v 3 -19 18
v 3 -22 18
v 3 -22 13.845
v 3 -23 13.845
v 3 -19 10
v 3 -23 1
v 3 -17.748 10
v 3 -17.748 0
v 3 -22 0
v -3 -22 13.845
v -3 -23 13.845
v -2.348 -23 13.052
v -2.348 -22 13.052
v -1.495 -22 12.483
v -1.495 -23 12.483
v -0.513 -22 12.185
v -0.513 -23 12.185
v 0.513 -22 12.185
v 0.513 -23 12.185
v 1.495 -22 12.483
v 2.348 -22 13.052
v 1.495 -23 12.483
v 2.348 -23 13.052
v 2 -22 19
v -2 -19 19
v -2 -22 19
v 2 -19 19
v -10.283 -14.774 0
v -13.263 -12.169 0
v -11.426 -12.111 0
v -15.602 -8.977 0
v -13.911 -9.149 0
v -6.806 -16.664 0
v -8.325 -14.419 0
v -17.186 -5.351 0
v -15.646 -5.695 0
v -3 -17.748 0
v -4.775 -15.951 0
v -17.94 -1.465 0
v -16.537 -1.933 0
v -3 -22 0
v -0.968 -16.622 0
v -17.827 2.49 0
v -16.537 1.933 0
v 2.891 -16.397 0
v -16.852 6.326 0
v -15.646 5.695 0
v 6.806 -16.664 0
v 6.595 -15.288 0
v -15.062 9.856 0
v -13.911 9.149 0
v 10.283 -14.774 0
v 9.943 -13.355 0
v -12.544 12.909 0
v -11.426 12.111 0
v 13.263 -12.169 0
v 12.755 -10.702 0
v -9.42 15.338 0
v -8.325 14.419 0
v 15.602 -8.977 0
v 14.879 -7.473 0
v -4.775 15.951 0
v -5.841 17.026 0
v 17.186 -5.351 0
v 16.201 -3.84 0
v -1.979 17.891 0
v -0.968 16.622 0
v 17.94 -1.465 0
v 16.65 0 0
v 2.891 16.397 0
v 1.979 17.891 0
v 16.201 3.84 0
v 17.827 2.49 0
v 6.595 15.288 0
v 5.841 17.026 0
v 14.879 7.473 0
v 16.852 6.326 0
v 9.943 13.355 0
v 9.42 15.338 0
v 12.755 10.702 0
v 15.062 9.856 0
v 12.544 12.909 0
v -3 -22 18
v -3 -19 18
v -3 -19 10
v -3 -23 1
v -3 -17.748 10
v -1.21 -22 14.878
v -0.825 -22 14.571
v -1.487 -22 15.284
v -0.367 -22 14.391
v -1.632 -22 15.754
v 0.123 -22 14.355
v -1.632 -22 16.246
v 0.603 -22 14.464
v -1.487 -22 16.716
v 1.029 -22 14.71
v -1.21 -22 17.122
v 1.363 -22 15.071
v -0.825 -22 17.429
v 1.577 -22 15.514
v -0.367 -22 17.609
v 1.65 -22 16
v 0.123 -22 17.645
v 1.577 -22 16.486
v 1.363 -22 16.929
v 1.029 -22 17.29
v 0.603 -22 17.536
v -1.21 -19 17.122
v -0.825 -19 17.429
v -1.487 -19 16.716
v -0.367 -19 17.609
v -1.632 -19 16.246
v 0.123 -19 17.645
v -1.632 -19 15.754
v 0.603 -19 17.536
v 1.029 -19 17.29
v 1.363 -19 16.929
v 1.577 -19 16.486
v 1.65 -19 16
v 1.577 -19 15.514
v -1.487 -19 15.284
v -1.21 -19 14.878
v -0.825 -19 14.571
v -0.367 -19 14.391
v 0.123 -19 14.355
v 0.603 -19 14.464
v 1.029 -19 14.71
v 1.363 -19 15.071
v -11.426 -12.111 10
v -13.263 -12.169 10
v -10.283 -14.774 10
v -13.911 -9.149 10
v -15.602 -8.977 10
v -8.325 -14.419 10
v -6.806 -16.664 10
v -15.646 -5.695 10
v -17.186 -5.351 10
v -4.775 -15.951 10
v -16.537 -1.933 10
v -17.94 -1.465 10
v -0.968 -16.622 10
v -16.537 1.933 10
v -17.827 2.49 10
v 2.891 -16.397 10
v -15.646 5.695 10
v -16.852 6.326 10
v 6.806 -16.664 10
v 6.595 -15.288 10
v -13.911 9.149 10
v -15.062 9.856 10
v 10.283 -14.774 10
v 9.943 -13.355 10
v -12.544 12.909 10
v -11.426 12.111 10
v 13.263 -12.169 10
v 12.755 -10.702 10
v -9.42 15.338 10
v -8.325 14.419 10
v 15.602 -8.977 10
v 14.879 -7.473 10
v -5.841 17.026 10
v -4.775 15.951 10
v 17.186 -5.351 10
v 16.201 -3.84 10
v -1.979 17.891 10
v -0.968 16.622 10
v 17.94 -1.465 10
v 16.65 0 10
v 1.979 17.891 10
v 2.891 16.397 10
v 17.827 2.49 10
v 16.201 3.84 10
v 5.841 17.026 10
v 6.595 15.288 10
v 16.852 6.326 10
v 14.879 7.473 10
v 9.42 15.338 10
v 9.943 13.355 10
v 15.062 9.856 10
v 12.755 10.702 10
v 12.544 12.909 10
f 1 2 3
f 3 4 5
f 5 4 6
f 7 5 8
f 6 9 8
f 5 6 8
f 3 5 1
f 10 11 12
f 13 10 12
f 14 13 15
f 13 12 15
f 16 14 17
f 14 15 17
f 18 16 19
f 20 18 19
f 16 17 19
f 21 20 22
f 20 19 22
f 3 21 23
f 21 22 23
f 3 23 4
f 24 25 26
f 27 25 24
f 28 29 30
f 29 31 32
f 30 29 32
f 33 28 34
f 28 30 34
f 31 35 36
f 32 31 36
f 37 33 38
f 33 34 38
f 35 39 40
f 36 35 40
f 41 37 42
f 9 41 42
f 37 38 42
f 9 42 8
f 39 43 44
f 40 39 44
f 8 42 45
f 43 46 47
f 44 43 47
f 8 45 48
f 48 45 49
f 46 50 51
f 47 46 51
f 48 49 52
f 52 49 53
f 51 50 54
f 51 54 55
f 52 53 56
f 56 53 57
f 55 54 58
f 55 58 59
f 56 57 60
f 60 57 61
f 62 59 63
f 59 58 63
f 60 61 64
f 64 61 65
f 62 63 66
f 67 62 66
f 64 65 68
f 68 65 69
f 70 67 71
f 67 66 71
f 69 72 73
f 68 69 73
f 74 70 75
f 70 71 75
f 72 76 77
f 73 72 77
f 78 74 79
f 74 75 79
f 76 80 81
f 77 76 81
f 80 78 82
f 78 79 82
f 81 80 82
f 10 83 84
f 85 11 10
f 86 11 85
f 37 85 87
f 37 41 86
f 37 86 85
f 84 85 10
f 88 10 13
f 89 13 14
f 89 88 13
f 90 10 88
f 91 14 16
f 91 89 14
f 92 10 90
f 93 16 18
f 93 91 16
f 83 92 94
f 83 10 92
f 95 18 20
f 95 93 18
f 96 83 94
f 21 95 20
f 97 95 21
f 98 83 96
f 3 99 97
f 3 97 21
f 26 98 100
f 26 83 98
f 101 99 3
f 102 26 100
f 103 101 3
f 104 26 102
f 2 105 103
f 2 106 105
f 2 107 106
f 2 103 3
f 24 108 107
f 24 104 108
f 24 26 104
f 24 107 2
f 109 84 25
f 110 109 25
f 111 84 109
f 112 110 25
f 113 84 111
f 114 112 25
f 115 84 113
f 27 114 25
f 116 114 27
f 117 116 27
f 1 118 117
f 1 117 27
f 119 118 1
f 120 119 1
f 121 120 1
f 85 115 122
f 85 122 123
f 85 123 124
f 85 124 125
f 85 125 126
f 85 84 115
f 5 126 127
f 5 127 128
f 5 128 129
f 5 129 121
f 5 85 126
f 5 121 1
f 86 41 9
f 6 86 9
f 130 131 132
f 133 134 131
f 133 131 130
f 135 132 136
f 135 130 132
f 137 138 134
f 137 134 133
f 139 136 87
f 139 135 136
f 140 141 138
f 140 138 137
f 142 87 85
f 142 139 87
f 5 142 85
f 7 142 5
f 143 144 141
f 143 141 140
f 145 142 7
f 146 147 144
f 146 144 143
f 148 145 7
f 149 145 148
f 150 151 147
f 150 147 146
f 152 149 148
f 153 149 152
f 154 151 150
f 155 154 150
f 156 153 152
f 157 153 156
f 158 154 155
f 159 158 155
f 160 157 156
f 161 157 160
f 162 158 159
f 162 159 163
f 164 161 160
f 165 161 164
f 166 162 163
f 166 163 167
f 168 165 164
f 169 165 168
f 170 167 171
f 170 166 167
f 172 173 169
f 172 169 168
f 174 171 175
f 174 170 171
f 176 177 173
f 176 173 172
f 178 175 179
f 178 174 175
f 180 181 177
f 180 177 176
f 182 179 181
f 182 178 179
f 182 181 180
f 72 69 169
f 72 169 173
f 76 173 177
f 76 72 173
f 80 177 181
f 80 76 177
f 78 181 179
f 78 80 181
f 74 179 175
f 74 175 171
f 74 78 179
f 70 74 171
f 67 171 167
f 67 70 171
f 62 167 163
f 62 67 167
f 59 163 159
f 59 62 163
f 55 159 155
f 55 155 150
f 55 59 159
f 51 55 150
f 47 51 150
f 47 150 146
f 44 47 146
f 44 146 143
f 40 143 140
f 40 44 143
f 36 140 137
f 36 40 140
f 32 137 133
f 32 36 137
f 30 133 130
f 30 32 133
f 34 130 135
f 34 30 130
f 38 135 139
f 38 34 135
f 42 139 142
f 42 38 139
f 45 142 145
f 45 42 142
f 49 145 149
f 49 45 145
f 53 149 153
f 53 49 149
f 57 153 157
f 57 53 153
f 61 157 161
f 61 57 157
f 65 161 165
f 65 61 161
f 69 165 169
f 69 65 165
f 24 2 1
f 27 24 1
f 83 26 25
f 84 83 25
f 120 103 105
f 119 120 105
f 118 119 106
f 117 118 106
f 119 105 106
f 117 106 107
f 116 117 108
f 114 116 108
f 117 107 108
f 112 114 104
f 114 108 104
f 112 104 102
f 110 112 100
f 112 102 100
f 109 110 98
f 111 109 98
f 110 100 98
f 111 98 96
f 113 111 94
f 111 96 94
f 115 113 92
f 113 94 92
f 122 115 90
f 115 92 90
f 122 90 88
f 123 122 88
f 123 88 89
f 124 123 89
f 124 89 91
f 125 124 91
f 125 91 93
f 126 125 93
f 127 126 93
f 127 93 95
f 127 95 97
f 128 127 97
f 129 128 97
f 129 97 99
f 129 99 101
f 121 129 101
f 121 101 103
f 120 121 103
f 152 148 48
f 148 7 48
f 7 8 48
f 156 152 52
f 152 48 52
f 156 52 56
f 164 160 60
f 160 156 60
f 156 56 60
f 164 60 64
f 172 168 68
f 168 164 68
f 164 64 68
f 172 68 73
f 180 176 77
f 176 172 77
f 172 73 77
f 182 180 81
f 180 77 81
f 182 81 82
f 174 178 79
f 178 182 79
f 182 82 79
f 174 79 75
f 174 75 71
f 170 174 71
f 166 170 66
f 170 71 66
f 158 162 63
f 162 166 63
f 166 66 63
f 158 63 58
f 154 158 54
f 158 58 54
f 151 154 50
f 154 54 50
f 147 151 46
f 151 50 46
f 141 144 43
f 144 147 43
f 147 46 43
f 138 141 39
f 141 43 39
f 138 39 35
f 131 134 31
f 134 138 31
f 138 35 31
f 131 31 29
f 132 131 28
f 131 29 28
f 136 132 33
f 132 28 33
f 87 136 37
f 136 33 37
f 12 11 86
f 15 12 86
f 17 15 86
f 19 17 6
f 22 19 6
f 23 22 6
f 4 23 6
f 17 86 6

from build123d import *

# Parameters (mm, degrees)
SKETCH002_R     = 18
SKETCH002_R_2   = 16.65
PAD002_DEPTH    = 10
PAD003_DEPTH    = 10
SKETCH004_W     = 6
SKETCH004_H     = 4
PAD004_DEPTH    = 9
SKETCH005_R     = 1.65
POCKET_DEPTH    = 5
POCKET001_DEPTH = 1
CHAMFER001_SIZE = 1
CHAMFER002_SIZE = 1


with BuildPart() as part:
    # Sketch002 → Pad002 (new body)
    with BuildSketch(Plane.XY):
        Circle(SKETCH002_R)
        Circle(SKETCH002_R_2, mode=Mode.SUBTRACT)
    extrude(amount=PAD002_DEPTH)

    # Sketch003 (on Face3 of Pad002) → Pad003 (join)
    with BuildSketch(Plane(origin=(0, 0, 0), x_dir=(1, 0, 0), z_dir=(0, 0, -1))):
        with BuildLine():
            ThreePointArc((3, 17), (0, 17.262677), (-3, 17))
            Line((-3, 17), (-3, 23))
            Line((-3, 23), (3, 23))
            Line((3, 23), (3, 17))
        make_face()
    extrude(amount=-PAD003_DEPTH)

    # Sketch004 (on Face10 of Pad003) → Pad004 (join)
    with BuildSketch(Plane.XY.offset(10)):
        with Locations((0, -21)):
            Rectangle(SKETCH004_W, SKETCH004_H)
    extrude(amount=PAD004_DEPTH)

    # Sketch005 (on Face14 of Pad004) → Pocket (cut)
    with BuildSketch(Plane.XZ.offset(23)):
        with Locations((0, 16)):
            Circle(SKETCH005_R)
    extrude(amount=-POCKET_DEPTH, mode=Mode.SUBTRACT)

    # Sketch006 (on Face14 of Pocket) → Pocket001 (cut)
    with BuildSketch(Plane.XZ.offset(23)):
        with BuildLine():
            ThreePointArc((-3.5, 15.647562), (0, 12.147562), (3.5, 15.647562))
            Line((3.5, 15.647562), (3.5, 19))
            Line((3.5, 19), (-3.5, 19))
            Line((-3.5, 15.647562), (-3.5, 19))
        make_face()
    extrude(amount=-POCKET001_DEPTH, mode=Mode.SUBTRACT)

    # Chamfer001
    chamfer001_edges = [part.edges().sort_by_distance(p)[0] for p in [
        (3, -20.5, 19),
        (-3, -20.5, 19),
    ]]
    chamfer(chamfer001_edges, length=CHAMFER001_SIZE)

    # Chamfer002
    chamfer002_edges = [part.edges().sort_by_distance(p)[0] for p in [
        (0, -23, 0),
    ]]
    chamfer(chamfer002_edges, length=CHAMFER002_SIZE)


solid = part.part
